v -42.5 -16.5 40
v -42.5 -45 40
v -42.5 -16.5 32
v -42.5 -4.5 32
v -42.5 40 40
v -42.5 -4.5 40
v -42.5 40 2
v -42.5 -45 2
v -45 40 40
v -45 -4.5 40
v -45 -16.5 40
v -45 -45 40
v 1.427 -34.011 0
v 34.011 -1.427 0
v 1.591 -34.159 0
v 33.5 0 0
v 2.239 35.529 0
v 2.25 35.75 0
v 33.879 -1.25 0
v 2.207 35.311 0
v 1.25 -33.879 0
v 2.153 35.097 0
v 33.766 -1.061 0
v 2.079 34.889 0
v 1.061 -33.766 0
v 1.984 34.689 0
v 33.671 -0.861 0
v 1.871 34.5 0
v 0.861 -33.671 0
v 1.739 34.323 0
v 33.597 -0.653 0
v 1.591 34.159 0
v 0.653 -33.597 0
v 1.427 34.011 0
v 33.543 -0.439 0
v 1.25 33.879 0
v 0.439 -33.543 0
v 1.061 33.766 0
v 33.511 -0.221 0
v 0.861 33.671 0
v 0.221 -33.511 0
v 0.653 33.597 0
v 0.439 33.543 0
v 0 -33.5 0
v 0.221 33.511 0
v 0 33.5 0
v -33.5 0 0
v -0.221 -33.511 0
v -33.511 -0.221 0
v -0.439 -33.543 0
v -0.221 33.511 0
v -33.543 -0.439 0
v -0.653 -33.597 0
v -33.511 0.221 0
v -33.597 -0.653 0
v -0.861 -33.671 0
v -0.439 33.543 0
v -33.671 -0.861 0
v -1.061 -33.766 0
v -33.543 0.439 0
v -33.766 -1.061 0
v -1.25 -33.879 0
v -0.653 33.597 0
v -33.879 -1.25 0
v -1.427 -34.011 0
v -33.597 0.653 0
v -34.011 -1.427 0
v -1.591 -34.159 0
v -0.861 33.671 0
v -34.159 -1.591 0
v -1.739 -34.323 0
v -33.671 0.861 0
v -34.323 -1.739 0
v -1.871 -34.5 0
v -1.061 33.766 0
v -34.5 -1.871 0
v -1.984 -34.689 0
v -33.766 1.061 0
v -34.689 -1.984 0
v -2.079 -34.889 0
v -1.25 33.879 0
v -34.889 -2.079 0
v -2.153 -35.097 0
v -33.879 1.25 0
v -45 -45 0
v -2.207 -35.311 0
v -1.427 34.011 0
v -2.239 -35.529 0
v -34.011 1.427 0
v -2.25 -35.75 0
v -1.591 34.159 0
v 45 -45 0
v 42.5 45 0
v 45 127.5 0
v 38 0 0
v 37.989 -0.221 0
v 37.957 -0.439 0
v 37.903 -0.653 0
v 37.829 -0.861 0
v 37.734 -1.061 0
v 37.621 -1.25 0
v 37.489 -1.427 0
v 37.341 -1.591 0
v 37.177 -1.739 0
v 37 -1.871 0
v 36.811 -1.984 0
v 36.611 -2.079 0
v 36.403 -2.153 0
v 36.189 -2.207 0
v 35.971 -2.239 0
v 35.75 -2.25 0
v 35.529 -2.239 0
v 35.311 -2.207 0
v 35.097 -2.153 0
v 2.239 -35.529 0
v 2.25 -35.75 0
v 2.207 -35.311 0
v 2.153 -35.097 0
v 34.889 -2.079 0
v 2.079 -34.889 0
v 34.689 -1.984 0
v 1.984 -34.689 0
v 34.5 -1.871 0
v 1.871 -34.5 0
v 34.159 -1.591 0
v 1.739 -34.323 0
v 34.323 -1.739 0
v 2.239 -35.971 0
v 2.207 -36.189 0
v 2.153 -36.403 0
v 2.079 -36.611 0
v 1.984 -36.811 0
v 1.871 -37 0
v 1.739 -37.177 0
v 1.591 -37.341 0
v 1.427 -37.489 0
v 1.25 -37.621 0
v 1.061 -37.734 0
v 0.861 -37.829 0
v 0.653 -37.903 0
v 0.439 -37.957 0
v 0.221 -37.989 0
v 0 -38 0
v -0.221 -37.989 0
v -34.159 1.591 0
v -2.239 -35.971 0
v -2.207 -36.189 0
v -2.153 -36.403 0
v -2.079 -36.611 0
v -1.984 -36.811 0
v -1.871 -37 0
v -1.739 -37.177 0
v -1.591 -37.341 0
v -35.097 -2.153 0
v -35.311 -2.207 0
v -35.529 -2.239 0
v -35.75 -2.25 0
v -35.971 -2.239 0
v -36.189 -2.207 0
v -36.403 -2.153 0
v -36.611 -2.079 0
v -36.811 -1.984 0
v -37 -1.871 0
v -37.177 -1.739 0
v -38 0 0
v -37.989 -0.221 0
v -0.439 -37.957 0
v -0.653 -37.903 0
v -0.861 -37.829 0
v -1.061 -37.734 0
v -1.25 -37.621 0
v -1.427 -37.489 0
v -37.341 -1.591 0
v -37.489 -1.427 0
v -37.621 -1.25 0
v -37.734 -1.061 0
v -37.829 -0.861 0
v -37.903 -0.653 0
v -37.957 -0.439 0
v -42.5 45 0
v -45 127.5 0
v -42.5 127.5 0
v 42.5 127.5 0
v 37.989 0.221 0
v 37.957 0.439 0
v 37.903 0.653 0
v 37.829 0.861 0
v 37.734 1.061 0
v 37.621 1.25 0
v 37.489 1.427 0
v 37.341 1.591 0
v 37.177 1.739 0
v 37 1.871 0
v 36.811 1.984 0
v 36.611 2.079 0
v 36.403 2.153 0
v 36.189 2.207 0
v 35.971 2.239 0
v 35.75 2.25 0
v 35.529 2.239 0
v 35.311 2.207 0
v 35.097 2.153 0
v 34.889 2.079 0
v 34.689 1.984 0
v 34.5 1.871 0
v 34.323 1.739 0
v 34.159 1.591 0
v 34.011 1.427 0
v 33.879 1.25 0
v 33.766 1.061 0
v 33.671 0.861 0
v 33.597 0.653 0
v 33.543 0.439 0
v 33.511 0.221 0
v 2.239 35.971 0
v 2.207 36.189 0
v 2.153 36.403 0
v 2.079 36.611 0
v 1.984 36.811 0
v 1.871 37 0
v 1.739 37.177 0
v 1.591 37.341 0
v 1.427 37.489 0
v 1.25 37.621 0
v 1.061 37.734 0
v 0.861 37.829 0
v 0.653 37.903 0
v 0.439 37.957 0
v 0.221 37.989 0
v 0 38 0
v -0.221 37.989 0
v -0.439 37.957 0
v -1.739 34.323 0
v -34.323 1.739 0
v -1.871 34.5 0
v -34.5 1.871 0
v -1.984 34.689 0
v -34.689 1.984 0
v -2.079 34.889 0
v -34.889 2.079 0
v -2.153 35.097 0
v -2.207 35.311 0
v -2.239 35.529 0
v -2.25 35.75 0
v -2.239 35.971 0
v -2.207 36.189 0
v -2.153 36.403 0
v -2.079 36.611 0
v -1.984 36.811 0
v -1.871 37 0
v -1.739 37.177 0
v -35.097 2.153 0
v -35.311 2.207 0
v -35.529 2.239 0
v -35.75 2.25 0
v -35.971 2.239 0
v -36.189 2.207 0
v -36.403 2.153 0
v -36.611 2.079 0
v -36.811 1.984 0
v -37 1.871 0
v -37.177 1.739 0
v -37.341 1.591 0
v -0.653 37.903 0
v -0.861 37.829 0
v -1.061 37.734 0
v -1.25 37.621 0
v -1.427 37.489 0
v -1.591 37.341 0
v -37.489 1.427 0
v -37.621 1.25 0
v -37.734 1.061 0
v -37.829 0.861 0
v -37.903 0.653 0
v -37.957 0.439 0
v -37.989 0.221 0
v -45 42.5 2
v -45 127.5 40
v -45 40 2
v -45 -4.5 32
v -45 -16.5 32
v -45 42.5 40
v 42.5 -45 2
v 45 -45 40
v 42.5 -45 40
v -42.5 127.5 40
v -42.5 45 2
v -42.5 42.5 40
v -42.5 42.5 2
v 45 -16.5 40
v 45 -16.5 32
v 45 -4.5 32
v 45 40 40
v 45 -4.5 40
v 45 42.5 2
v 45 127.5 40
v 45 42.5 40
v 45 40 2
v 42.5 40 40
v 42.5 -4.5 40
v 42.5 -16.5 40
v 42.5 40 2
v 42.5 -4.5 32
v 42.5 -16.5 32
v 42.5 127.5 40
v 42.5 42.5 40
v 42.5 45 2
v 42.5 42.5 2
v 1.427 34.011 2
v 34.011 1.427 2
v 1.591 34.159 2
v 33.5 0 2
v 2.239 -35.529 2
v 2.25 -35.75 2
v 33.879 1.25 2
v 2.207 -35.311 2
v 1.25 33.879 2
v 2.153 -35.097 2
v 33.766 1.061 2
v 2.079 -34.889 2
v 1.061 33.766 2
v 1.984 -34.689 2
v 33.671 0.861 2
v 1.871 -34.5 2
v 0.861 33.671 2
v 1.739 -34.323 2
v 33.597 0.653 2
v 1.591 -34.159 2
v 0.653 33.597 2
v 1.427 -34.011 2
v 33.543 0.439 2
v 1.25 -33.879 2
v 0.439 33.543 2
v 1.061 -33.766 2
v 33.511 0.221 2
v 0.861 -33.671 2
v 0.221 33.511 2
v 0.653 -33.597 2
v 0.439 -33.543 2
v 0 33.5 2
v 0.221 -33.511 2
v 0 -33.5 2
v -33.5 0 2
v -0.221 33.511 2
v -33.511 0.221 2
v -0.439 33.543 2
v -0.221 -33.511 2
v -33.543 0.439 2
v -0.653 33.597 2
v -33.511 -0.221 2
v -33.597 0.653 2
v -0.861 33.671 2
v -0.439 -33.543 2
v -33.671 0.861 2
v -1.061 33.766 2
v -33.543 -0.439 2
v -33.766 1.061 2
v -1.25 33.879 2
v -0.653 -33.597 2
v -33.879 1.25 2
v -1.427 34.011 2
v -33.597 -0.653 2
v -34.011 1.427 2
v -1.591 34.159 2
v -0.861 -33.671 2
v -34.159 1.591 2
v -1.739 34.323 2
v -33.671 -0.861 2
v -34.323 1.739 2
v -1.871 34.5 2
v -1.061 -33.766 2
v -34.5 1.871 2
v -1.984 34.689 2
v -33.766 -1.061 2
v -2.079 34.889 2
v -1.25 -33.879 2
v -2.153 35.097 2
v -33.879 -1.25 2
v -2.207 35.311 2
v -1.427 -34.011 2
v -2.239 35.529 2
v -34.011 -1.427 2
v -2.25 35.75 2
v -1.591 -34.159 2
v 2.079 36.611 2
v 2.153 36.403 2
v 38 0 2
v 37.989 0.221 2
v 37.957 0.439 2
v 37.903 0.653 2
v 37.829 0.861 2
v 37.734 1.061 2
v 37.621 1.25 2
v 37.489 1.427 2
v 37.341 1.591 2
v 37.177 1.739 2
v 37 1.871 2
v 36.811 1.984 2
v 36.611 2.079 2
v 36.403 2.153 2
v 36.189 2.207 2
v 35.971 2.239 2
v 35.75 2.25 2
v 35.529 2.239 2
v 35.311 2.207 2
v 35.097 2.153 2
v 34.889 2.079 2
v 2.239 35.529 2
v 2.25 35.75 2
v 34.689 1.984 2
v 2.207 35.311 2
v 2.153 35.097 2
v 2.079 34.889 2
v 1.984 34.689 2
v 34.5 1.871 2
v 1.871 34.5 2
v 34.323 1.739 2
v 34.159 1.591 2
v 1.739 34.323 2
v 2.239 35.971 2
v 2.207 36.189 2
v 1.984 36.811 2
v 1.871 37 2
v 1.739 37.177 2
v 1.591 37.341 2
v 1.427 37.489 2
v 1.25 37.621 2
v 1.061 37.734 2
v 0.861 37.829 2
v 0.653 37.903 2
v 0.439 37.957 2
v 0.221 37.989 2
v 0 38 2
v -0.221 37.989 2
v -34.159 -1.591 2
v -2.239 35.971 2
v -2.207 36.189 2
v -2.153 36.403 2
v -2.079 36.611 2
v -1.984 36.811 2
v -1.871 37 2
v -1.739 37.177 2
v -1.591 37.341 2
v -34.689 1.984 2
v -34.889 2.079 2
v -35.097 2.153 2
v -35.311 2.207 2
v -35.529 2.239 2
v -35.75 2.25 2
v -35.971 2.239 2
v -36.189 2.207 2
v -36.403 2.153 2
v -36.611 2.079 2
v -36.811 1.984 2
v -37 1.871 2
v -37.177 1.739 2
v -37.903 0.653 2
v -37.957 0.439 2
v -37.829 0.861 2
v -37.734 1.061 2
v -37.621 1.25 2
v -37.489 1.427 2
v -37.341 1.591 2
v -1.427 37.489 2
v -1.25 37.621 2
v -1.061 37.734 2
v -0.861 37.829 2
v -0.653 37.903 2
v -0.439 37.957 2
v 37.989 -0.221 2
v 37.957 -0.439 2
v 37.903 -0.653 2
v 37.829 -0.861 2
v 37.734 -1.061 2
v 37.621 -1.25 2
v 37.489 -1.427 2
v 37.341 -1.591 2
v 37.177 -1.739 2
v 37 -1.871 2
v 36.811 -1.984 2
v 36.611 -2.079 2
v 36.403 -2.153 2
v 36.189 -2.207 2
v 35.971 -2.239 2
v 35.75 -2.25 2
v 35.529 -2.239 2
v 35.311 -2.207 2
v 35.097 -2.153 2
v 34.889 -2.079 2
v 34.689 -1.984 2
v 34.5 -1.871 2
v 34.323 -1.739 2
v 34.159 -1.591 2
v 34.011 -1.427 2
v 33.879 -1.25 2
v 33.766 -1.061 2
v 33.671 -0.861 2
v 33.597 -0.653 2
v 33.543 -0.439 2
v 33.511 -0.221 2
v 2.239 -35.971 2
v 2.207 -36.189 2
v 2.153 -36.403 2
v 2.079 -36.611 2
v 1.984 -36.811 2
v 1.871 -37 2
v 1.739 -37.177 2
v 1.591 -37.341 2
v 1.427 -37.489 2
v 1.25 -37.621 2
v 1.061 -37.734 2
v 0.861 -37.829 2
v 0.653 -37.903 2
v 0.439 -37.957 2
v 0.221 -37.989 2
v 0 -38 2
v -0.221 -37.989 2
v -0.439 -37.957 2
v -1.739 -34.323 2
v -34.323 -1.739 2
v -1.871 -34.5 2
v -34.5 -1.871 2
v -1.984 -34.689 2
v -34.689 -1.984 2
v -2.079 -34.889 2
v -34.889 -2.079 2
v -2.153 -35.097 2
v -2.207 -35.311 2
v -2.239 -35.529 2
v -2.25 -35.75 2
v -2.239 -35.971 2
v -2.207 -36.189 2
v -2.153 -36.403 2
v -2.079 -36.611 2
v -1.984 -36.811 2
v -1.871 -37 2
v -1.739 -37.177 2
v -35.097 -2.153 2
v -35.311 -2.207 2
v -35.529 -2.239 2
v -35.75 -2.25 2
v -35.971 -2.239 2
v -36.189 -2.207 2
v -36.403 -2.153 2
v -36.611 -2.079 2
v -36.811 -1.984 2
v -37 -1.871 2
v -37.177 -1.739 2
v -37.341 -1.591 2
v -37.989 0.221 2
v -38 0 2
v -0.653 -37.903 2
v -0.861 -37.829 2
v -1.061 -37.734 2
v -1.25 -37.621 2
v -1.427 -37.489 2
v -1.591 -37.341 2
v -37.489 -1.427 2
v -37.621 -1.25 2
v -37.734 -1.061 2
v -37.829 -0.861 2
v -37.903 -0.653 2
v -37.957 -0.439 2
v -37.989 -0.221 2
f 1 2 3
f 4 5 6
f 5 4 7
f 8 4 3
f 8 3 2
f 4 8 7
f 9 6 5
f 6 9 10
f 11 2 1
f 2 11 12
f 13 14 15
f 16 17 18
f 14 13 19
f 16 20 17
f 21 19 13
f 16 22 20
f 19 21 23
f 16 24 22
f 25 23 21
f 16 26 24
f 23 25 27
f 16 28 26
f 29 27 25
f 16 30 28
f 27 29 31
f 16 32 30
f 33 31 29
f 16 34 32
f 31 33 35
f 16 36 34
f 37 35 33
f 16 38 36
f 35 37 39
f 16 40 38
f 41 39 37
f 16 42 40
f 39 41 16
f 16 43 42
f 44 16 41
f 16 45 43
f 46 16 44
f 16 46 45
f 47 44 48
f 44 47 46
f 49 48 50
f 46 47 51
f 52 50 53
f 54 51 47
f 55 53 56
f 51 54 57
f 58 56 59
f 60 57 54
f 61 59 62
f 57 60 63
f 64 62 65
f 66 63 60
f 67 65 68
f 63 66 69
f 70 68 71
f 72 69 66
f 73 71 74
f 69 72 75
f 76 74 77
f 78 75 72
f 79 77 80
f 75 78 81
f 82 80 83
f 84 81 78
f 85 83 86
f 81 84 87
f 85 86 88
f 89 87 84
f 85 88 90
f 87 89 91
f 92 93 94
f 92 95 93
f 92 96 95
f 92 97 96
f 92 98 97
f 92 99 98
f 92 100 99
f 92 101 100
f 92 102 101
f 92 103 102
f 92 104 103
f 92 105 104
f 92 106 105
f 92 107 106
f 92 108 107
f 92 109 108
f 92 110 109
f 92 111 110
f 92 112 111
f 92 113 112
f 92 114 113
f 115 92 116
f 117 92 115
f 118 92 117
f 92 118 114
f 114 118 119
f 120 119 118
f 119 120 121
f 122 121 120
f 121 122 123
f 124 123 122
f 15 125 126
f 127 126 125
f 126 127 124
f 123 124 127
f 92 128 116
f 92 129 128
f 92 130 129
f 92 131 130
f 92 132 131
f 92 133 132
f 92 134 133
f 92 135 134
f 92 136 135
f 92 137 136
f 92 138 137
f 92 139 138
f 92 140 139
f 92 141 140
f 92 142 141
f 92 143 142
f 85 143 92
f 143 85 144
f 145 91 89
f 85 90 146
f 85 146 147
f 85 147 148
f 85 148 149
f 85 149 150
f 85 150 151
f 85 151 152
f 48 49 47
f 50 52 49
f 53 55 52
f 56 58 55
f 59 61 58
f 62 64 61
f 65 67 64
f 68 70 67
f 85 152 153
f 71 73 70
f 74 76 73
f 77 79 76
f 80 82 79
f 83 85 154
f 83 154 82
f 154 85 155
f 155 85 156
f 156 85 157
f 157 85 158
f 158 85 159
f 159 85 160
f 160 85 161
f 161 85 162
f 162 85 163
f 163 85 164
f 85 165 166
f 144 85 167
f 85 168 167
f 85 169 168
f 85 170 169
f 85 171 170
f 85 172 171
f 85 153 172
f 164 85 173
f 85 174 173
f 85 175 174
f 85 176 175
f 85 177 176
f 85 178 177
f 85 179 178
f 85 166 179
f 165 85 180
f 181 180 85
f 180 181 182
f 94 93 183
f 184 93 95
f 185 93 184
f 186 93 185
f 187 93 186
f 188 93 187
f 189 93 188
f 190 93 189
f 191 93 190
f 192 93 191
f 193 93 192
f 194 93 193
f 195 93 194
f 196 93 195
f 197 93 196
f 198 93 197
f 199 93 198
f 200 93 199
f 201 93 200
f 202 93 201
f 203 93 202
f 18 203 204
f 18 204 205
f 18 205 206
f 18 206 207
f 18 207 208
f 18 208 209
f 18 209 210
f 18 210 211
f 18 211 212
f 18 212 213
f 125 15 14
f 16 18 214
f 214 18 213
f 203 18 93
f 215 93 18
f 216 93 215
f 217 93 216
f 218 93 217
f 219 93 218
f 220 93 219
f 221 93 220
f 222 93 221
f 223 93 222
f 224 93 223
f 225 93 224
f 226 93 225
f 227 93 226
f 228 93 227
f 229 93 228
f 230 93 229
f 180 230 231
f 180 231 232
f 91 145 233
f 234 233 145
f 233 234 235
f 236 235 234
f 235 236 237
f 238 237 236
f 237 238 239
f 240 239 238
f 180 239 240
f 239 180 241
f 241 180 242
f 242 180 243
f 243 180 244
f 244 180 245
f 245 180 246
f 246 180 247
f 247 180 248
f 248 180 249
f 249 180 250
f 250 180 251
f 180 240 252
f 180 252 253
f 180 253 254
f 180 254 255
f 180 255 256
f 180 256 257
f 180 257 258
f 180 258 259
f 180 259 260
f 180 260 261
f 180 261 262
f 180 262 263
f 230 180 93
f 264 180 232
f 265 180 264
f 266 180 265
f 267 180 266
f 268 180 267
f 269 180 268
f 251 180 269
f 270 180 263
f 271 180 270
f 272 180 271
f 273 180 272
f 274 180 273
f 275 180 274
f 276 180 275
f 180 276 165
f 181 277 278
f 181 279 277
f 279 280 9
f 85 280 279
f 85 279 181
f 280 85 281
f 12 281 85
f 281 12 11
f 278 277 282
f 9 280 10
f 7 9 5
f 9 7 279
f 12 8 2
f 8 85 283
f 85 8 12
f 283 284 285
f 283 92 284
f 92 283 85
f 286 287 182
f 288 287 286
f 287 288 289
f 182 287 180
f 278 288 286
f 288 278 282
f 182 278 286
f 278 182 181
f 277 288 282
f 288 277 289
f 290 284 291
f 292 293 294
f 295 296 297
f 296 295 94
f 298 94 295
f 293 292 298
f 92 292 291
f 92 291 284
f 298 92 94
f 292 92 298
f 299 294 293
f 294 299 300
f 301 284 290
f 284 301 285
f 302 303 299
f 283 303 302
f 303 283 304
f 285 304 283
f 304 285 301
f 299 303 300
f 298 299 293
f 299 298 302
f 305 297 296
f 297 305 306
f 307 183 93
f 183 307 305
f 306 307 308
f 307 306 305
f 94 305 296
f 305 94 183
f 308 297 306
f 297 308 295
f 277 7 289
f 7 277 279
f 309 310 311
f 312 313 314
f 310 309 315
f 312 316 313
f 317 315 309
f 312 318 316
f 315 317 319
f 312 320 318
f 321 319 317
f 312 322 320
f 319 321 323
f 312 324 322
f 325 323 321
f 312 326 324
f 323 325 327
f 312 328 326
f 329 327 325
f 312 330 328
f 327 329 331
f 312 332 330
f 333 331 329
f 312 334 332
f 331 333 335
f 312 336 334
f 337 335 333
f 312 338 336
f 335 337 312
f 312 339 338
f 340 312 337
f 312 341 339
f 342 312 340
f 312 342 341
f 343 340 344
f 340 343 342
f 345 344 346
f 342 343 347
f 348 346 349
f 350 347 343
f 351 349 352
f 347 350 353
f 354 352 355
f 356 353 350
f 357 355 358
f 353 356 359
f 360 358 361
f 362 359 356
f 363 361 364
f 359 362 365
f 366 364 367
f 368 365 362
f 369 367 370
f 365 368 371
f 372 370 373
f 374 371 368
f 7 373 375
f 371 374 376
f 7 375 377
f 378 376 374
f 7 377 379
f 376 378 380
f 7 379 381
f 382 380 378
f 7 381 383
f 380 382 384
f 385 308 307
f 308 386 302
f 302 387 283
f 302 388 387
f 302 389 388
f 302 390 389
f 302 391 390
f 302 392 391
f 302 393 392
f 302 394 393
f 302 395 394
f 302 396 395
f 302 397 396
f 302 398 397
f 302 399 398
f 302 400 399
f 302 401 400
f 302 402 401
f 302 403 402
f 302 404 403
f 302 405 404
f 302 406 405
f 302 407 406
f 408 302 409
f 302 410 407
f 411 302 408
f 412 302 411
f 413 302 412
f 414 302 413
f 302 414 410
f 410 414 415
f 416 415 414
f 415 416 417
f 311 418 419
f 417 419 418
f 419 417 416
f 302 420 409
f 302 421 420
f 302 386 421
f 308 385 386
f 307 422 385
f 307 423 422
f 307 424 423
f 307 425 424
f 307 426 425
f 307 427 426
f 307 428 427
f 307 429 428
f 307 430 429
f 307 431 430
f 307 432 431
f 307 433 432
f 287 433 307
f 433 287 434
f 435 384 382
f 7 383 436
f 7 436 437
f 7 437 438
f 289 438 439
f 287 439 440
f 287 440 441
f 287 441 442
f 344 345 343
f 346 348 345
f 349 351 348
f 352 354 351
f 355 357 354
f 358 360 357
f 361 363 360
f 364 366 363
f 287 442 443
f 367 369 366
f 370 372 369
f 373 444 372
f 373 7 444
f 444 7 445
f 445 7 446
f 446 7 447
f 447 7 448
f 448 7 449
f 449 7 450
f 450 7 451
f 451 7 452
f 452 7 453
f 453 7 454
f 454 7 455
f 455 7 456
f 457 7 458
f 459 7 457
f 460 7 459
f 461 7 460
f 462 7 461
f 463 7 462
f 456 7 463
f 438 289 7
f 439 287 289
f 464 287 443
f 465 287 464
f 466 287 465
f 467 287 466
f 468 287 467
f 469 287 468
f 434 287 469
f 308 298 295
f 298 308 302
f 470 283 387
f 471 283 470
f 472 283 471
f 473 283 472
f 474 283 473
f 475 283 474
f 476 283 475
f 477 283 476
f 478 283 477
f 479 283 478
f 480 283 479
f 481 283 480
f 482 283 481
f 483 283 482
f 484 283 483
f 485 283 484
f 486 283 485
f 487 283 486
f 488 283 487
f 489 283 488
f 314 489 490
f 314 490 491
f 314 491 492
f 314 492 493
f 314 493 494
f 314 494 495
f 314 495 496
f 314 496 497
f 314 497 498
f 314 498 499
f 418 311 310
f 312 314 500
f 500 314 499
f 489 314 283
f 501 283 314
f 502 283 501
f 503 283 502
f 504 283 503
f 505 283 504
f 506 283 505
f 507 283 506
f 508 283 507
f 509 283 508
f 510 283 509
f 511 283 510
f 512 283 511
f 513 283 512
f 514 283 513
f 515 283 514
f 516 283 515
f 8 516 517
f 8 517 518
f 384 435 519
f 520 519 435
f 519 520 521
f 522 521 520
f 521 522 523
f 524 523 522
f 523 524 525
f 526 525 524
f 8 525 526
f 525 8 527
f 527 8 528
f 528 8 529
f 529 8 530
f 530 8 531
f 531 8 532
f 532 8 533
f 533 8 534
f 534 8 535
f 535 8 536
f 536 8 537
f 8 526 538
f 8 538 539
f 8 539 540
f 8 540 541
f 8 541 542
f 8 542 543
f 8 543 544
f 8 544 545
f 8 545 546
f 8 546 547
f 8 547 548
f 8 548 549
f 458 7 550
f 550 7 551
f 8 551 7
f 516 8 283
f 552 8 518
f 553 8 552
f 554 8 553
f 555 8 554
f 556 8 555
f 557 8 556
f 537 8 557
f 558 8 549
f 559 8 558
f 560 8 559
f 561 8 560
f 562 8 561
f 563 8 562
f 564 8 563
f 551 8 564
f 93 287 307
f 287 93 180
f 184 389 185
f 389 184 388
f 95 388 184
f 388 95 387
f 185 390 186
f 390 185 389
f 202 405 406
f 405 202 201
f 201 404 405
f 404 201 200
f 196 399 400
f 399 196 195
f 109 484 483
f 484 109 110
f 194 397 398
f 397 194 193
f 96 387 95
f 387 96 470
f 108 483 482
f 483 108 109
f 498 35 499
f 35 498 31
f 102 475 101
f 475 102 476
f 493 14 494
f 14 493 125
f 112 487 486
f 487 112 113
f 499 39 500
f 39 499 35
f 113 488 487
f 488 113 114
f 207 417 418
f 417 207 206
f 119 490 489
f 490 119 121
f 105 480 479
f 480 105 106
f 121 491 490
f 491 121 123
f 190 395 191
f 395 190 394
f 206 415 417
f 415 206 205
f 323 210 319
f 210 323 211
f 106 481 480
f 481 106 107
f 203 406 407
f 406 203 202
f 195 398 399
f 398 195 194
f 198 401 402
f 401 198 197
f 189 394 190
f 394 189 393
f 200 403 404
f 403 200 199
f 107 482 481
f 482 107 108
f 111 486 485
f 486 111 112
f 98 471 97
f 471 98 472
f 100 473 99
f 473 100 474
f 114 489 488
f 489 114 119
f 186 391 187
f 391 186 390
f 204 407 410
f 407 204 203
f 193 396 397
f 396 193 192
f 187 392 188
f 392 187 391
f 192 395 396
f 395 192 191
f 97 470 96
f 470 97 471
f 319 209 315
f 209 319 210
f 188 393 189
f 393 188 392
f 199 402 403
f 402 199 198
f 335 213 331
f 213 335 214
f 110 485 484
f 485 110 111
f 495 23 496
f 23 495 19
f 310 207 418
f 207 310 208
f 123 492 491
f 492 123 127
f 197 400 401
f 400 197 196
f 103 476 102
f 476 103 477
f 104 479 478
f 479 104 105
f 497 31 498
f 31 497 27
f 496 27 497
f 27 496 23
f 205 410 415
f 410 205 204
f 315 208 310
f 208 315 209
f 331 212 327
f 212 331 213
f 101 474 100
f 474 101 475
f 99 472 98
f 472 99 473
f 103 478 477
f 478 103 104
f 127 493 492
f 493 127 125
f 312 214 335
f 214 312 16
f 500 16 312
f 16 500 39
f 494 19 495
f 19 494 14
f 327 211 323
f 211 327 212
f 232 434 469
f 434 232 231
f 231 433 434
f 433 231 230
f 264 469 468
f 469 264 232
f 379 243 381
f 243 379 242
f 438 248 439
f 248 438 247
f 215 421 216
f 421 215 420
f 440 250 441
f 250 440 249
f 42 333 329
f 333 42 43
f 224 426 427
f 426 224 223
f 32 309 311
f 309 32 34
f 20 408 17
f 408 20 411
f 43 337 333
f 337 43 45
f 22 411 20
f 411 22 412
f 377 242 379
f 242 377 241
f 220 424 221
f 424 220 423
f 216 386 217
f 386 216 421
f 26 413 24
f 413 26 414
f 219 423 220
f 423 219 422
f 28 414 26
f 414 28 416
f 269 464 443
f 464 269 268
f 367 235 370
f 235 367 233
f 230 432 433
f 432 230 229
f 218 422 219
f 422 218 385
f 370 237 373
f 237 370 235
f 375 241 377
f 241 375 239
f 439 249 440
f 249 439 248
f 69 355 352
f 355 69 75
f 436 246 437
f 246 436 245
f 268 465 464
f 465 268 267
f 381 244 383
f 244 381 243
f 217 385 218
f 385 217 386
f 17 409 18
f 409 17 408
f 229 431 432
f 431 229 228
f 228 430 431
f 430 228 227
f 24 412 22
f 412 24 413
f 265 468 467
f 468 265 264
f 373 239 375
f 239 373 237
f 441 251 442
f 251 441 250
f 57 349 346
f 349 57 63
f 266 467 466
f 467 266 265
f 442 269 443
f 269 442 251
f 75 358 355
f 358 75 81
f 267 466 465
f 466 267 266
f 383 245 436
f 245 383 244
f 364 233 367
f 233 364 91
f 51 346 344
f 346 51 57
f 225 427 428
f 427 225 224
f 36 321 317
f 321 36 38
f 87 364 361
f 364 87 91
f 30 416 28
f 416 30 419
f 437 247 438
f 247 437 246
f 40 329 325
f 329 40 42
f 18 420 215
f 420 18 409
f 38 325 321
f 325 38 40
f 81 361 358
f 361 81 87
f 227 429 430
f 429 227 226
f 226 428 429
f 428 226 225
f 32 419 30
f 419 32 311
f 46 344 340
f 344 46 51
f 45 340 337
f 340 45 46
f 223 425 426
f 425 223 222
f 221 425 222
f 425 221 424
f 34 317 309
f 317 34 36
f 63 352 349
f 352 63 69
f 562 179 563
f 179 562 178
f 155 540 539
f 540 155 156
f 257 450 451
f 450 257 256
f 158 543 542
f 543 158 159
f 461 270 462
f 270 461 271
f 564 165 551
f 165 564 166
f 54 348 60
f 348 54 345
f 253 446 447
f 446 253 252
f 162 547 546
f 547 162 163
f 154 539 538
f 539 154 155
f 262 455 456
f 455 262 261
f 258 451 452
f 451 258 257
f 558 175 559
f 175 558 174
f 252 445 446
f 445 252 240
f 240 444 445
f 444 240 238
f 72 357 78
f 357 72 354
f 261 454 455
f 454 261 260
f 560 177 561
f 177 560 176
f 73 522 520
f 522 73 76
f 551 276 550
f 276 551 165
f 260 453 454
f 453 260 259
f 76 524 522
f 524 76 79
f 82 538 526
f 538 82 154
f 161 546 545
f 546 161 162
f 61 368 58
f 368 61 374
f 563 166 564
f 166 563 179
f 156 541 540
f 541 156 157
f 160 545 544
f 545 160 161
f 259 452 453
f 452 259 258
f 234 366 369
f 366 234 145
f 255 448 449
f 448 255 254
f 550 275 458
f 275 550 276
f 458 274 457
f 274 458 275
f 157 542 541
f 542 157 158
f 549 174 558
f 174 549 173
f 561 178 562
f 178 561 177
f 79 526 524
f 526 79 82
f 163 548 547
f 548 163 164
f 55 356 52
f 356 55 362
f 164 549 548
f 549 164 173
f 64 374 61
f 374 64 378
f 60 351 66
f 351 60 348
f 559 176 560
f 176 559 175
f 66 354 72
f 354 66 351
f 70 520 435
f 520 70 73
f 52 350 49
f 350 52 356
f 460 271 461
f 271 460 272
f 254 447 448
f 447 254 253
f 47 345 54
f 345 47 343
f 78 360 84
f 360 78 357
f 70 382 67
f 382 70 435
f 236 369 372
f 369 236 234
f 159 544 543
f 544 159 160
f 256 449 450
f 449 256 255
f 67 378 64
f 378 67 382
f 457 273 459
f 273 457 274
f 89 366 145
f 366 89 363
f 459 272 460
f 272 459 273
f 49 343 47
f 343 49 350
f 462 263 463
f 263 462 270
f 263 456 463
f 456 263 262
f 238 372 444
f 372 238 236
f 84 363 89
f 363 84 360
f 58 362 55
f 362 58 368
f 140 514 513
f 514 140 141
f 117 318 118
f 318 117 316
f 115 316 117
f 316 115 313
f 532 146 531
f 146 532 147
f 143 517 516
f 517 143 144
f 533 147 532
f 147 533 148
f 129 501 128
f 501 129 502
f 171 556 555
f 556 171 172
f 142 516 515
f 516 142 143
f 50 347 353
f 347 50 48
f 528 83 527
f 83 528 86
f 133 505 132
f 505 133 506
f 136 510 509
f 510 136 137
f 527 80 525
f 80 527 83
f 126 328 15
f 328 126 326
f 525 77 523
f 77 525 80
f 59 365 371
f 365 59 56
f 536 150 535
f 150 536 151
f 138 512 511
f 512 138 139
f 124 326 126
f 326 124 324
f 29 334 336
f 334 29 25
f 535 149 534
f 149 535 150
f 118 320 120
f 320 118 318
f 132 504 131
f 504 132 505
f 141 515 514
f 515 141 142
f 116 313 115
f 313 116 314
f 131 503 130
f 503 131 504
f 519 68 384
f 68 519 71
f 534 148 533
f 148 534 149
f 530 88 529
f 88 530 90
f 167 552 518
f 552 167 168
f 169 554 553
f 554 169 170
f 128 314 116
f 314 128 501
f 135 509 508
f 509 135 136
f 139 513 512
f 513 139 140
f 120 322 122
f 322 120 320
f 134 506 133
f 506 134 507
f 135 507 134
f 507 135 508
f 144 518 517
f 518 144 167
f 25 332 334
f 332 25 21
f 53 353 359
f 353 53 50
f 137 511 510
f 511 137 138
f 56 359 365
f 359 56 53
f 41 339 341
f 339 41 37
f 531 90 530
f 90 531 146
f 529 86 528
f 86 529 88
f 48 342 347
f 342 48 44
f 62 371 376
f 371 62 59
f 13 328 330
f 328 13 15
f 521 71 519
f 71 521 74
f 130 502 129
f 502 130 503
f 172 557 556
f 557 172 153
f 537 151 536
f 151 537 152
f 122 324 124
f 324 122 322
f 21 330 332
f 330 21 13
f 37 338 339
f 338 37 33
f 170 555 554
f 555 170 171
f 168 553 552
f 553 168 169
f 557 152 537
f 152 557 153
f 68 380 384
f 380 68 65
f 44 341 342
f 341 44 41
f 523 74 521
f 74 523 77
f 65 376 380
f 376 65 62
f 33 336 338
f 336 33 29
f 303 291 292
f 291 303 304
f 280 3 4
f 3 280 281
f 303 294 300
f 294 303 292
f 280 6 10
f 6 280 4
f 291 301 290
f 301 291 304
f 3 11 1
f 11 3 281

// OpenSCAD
// DIY magnetic stirrer housing for an 80 mm PC case fan
// Print orientation: top plate on the bed (z = 0), walls build upward (+Z)
// Note: this is upside down in use; the open top becomes the stirring surface

// ---------- Dimensions (mm) ----------
plate_t      = 2;     // top plate thickness (z = 0 to 2)
wall_t       = 2.5;   // wall thickness
box_h        = 40;    // outer wall height (z = 0 to 40)
outer_x      = 90;    // outer size in X
outer_y      = 90;    // outer size in Y
hole_d       = 4.5;   // M4 screw hole diameter
hole_pitch   = 71.5;  // square pattern centre-to-centre distance for holes
notch_w      = 12;    // cable notch width
notch_depth  = 8;     // cable notch depth from open edge (z = 32 to 40)
eps          = 0.5;   // cutter overshoot past faces

$fn = 64;

// ---------- Model ----------
difference() {
    union() {
        // Top plate
        translate([-outer_x/2, -outer_y/2, 0])
            cube([outer_x, outer_y, plate_t]);

        // Four walls rising from the top plate to z = box_h
        for (dx = [-1, 1], dy = [-1, 1])
            translate([dx > 0 ? outer_x/2 - wall_t : -outer_x/2,
                       dy > 0 ? outer_y/2 - wall_t : -outer_y/2,
                       0])
                cube([wall_t, outer_y - 2*wall_t, box_h]);
    }

    // Screw holes through the top plate on a 71.5 mm square pattern
    for (a = [0, 90, 180, 270])
        rotate([0, 0, a])
            translate([hole_pitch/2, 0, -eps])
                cylinder(d = hole_d, h = plate_t + 2*eps);

    // Cable notch cut into one wall, centred along the wall
    translate([-outer_x/2, -outer_y/2/2 + notch_w/2, box_h - notch_depth])
        cube([outer_x, notch_w, notch_depth + eps]);
}
